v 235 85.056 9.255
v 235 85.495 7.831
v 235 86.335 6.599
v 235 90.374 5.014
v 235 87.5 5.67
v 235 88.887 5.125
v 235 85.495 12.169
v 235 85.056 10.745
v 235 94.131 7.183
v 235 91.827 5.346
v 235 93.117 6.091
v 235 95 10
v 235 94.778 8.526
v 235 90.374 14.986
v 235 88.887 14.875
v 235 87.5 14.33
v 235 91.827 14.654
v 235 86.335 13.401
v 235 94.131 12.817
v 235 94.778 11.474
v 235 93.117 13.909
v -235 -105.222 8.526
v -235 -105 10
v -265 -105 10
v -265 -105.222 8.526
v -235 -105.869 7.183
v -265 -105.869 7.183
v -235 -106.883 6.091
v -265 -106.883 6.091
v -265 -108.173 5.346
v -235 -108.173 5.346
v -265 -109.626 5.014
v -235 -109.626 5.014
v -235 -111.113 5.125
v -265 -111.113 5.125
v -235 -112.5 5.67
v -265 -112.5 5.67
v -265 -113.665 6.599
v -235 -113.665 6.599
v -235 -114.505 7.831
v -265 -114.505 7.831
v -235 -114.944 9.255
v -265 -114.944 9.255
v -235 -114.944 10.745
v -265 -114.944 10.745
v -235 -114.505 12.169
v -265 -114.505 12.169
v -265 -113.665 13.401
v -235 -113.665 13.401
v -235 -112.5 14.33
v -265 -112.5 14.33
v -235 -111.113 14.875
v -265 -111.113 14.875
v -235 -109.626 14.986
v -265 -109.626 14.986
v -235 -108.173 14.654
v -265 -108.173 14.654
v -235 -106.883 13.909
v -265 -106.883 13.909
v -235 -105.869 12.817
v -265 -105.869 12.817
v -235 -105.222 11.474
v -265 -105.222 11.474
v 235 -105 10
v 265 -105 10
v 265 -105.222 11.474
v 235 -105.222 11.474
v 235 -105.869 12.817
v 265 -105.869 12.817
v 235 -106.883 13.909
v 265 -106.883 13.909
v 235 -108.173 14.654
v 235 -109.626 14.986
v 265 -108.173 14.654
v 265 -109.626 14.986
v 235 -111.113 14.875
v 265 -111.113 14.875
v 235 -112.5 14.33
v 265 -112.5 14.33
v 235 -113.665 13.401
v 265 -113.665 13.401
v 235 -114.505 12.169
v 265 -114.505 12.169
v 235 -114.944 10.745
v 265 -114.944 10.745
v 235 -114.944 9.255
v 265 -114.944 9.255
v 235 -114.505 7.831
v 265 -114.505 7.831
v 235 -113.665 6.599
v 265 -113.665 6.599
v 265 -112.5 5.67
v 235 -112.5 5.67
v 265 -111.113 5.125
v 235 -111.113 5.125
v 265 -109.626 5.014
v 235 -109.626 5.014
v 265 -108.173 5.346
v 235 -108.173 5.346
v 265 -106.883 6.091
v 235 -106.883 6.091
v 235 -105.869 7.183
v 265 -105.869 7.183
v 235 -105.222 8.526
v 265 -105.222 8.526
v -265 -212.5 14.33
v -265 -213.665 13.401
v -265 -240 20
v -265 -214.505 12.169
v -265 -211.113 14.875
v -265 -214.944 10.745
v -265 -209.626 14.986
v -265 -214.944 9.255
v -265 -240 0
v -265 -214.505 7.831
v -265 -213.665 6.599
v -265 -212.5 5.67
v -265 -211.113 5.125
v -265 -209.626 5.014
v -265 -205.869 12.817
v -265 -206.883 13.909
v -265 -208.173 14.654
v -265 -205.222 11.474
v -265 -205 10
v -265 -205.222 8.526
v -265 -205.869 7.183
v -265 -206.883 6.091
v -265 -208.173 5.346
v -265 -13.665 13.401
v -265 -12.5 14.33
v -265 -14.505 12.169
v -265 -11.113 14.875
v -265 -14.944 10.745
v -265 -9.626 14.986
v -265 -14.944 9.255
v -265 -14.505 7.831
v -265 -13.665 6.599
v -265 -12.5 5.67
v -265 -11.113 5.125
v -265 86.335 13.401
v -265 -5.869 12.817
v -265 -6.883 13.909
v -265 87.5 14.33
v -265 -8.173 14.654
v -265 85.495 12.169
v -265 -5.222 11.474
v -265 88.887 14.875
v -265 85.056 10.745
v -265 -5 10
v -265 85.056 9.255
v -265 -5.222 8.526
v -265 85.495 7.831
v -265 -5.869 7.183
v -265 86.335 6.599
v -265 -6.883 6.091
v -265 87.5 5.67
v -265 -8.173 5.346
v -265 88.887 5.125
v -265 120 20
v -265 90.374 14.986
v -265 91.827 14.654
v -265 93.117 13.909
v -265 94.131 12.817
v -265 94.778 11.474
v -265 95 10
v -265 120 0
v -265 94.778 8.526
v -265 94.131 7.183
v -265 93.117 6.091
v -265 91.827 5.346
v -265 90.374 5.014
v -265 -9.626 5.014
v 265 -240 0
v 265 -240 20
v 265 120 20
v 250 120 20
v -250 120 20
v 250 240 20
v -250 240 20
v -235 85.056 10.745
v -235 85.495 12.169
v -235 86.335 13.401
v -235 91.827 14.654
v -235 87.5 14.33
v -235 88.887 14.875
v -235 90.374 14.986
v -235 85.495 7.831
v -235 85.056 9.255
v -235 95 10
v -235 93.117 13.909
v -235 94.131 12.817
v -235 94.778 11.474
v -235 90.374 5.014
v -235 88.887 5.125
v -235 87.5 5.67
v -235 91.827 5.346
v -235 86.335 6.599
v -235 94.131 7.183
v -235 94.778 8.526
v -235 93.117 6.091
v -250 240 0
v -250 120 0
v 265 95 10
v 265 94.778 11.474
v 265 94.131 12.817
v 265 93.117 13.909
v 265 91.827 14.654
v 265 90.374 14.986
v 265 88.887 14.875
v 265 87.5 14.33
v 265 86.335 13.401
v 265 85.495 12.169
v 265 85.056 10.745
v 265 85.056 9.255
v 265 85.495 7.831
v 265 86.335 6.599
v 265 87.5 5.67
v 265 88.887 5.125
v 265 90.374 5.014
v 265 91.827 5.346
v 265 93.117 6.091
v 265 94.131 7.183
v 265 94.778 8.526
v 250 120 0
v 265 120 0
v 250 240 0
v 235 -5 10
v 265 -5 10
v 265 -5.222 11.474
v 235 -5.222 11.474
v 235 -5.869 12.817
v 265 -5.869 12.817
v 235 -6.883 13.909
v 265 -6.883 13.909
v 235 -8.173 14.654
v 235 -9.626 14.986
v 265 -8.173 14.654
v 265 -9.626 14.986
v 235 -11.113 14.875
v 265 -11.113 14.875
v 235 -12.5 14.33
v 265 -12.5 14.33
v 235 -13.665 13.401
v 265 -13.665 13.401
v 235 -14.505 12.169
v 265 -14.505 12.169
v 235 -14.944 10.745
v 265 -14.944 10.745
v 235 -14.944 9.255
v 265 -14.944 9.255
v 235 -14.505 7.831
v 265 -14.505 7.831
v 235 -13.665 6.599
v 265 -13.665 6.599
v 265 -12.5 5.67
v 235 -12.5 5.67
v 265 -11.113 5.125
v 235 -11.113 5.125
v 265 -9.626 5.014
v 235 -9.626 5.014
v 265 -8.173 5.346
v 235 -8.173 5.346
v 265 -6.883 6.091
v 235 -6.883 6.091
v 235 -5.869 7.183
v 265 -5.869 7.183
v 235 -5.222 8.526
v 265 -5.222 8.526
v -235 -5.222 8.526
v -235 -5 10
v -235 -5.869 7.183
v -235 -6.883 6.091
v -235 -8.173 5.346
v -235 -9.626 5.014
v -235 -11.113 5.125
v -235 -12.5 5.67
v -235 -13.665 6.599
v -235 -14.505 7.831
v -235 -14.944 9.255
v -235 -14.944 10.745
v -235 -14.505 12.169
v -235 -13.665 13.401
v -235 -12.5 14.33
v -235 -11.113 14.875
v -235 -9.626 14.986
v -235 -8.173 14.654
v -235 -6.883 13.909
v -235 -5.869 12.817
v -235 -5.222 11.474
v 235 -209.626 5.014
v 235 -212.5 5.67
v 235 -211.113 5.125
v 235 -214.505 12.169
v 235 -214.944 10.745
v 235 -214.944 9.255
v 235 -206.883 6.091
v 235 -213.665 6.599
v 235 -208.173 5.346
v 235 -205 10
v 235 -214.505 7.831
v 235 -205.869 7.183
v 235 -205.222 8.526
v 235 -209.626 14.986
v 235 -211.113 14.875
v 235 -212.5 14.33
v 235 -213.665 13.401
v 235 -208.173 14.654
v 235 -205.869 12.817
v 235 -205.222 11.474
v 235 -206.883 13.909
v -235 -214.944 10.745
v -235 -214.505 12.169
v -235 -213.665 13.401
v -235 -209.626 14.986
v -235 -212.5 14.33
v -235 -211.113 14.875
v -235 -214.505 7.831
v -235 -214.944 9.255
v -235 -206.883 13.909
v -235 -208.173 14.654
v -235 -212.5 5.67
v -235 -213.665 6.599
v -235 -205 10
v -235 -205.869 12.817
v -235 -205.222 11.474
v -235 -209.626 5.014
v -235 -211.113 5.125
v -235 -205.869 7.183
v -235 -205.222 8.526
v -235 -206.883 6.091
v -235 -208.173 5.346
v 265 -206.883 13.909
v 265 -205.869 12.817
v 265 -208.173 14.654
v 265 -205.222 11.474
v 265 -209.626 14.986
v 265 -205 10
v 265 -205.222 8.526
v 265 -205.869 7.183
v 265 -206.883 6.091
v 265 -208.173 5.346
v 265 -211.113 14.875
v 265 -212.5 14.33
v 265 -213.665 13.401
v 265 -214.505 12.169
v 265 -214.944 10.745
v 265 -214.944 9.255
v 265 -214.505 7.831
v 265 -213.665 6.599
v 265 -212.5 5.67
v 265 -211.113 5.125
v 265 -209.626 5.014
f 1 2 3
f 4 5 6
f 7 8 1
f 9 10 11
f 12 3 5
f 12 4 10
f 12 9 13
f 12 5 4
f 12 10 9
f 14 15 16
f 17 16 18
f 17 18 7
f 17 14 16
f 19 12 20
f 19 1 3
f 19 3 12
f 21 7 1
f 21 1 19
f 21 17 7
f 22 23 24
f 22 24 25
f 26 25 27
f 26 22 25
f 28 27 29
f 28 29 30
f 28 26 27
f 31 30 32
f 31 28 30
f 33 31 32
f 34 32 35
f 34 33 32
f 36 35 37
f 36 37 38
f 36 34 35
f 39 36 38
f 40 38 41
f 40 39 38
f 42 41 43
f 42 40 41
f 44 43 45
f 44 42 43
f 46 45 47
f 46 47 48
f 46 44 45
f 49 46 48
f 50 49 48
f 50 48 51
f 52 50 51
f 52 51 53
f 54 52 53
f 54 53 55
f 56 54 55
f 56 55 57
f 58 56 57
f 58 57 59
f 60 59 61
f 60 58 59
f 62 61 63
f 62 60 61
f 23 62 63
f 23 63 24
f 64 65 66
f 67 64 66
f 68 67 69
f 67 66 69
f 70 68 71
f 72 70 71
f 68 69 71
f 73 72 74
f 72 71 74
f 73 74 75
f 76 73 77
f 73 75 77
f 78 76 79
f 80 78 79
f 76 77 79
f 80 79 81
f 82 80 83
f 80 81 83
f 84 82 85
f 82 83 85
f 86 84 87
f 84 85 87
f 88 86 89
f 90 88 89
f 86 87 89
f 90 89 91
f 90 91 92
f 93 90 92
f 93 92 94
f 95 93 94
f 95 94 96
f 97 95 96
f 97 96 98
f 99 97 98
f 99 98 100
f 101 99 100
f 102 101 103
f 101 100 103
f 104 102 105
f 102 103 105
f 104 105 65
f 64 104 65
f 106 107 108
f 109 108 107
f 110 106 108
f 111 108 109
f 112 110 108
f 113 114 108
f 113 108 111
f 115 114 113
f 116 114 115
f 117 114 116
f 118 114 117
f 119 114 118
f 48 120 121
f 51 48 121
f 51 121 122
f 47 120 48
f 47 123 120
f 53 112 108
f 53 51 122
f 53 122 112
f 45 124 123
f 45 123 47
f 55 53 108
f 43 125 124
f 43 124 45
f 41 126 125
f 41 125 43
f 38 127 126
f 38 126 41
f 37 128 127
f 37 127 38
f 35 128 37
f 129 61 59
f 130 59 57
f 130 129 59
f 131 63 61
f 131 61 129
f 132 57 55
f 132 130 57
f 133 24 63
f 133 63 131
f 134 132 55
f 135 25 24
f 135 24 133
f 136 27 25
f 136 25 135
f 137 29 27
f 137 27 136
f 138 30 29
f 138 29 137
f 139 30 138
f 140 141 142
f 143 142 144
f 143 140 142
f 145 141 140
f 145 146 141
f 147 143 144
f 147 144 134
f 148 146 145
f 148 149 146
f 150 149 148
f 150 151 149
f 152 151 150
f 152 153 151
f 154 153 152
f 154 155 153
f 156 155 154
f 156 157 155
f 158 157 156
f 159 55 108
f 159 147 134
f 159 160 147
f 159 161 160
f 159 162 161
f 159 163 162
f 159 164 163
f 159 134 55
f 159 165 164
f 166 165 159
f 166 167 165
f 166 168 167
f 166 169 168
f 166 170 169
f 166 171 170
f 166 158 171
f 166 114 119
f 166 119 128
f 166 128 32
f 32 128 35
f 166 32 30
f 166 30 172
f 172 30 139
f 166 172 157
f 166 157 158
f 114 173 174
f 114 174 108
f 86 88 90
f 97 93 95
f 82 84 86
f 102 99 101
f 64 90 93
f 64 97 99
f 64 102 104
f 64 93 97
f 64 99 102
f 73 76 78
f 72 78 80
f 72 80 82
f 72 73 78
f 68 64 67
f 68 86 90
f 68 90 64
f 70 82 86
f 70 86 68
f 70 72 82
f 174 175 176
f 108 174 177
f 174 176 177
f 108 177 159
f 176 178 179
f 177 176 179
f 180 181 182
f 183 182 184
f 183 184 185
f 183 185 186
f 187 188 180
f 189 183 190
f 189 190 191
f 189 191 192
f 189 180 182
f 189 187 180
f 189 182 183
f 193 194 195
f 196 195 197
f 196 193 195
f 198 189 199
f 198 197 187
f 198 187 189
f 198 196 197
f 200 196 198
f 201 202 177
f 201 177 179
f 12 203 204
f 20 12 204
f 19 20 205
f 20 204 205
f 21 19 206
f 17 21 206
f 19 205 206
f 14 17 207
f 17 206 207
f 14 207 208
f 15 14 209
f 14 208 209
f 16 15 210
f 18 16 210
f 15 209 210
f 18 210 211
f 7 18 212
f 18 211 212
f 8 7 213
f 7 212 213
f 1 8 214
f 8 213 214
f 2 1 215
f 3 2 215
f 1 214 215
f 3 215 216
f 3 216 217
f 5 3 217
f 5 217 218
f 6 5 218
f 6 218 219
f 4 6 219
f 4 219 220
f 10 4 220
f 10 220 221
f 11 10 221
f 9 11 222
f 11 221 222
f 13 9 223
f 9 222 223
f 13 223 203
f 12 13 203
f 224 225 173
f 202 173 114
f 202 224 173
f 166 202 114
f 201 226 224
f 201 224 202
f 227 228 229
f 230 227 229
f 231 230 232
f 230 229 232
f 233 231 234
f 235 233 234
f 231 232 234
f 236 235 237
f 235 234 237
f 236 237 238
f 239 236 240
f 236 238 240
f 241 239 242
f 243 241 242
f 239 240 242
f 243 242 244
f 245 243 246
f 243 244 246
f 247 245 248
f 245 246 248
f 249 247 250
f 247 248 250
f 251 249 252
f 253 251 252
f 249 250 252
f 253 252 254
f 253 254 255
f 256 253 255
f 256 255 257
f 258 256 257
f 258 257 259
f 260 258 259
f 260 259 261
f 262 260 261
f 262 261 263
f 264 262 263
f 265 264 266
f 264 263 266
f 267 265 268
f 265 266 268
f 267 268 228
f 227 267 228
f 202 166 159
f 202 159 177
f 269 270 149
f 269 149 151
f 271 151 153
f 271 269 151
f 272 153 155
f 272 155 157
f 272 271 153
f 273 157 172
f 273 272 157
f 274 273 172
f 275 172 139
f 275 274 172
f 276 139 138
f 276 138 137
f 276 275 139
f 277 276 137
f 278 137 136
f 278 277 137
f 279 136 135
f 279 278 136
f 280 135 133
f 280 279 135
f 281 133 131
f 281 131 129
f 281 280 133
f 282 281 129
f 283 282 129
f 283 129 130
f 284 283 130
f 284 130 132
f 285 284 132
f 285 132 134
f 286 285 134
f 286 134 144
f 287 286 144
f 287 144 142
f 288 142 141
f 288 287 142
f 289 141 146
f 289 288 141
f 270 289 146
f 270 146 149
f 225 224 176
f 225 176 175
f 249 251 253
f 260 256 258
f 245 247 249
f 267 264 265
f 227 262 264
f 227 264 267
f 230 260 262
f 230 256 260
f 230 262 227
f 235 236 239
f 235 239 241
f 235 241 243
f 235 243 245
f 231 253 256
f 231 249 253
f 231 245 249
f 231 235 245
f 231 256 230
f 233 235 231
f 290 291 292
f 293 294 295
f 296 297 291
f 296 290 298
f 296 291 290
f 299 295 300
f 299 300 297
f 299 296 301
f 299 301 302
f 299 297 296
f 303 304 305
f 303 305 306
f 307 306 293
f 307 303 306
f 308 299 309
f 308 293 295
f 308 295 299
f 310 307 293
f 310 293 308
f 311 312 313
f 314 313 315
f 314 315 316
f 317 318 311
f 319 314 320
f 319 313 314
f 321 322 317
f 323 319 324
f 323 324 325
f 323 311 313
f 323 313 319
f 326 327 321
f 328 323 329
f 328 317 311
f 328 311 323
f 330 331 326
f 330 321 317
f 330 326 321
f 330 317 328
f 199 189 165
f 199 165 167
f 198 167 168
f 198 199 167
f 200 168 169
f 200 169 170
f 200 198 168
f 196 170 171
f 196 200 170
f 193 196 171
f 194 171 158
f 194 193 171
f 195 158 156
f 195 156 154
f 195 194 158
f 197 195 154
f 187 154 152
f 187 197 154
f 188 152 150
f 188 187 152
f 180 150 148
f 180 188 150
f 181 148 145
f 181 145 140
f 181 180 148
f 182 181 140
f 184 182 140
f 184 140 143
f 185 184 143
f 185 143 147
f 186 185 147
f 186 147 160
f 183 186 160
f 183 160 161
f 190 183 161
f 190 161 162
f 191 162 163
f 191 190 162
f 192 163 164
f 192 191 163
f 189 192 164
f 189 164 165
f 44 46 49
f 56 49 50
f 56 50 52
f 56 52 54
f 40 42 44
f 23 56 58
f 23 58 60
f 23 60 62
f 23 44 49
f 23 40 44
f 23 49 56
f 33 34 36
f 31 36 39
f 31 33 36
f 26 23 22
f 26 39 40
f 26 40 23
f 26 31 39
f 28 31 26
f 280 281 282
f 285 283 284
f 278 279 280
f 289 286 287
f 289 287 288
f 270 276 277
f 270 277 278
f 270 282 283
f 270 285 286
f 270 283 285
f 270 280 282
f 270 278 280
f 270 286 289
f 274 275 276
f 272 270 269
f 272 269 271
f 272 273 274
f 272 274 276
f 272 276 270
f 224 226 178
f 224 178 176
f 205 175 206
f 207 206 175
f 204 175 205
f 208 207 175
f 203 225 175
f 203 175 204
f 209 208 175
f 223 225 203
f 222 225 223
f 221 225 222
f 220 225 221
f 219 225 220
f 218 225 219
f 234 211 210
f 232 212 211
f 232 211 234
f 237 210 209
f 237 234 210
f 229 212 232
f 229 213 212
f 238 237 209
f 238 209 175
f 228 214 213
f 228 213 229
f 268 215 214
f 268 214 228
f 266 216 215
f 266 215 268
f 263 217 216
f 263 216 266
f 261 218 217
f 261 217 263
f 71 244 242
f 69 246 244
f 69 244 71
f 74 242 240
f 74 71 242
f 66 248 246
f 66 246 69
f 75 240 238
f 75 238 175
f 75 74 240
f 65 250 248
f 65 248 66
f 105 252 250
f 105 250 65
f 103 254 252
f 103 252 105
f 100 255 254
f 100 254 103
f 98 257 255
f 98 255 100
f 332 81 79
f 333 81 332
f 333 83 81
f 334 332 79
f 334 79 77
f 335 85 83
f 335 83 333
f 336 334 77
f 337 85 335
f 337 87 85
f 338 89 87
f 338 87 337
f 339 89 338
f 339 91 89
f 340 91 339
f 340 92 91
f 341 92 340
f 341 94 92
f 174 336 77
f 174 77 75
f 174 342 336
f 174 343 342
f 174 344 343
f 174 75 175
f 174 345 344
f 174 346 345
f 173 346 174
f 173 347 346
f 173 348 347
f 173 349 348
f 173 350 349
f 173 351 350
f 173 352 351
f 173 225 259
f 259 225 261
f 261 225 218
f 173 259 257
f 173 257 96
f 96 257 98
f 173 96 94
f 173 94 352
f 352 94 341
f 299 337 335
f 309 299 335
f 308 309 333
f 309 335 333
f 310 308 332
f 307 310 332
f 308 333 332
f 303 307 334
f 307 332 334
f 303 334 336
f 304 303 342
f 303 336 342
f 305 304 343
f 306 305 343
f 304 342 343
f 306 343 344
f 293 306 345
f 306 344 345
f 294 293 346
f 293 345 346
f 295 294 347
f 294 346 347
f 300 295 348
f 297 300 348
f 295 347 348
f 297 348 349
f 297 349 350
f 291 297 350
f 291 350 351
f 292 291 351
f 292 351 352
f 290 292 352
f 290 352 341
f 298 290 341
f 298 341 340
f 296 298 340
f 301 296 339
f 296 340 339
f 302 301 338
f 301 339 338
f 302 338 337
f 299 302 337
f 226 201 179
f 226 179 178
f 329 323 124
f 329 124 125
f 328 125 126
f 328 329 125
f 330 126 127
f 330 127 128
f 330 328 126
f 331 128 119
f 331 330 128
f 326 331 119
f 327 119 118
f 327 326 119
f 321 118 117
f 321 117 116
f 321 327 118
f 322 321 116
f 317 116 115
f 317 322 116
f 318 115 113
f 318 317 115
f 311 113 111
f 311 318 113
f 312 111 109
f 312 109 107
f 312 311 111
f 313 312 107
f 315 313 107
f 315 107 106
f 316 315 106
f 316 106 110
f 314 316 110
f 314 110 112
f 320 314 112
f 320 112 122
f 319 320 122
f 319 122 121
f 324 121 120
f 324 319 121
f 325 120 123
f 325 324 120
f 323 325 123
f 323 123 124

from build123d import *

# Parameters (mm, degrees)
BOSS_EXTRUDE1_DEPTH = 20
SKETCH3_R           = 5
CUT_EXTRUDE1_DEPTH  = 30
CUT_EXTRUDE2_START  = -30
SKETCH4_R           = 5
CUT_EXTRUDE2_DEPTH  = 30


with BuildPart() as part:
    # Sketch1 → Boss-Extrude1 (new body)
    with BuildSketch(Plane.XY):
        Polygon((-250, 240), (250, 240), (250, 120), (265, 120), (265, -240), (-265, -240), (-265, 120), (-250, 120), align=None)
    extrude(amount=BOSS_EXTRUDE1_DEPTH)

    # Sketch3 → Cut-Extrude1 (cut)
    with BuildSketch(Plane(origin=(265, 0, 0), x_dir=(0, 0, -1), z_dir=(1, 0, 0))):
        with Locations(Location((-10, -210, 0), (0, 0, 90))):
            Circle(SKETCH3_R)
        with Locations(Location((-10, -110, 0), (0, 0, 90))):
            Circle(SKETCH3_R)
        with Locations(Location((-10, -10, 0), (0, 0, 90))):
            Circle(SKETCH3_R)
        with Locations(Location((-10, 90, 0), (0, 0, 90))):
            Circle(SKETCH3_R)
    extrude(amount=-CUT_EXTRUDE1_DEPTH, mode=Mode.SUBTRACT)

    # Sketch4 → Cut-Extrude2 (cut)
    with BuildSketch(Plane.ZY.offset(265).offset(CUT_EXTRUDE2_START)):
        with Locations(Location((10, -210, 0), (0, 0, 90))):
            Circle(SKETCH4_R)
        with Locations(Location((10, -110, 0), (0, 0, 90))):
            Circle(SKETCH4_R)
        with Locations(Location((10, -10, 0), (0, 0, 90))):
            Circle(SKETCH4_R)
        with Locations(Location((10, 90, 0), (0, 0, 90))):
            Circle(SKETCH4_R)
    extrude(amount=CUT_EXTRUDE2_DEPTH, mode=Mode.SUBTRACT)


solid = part.part
